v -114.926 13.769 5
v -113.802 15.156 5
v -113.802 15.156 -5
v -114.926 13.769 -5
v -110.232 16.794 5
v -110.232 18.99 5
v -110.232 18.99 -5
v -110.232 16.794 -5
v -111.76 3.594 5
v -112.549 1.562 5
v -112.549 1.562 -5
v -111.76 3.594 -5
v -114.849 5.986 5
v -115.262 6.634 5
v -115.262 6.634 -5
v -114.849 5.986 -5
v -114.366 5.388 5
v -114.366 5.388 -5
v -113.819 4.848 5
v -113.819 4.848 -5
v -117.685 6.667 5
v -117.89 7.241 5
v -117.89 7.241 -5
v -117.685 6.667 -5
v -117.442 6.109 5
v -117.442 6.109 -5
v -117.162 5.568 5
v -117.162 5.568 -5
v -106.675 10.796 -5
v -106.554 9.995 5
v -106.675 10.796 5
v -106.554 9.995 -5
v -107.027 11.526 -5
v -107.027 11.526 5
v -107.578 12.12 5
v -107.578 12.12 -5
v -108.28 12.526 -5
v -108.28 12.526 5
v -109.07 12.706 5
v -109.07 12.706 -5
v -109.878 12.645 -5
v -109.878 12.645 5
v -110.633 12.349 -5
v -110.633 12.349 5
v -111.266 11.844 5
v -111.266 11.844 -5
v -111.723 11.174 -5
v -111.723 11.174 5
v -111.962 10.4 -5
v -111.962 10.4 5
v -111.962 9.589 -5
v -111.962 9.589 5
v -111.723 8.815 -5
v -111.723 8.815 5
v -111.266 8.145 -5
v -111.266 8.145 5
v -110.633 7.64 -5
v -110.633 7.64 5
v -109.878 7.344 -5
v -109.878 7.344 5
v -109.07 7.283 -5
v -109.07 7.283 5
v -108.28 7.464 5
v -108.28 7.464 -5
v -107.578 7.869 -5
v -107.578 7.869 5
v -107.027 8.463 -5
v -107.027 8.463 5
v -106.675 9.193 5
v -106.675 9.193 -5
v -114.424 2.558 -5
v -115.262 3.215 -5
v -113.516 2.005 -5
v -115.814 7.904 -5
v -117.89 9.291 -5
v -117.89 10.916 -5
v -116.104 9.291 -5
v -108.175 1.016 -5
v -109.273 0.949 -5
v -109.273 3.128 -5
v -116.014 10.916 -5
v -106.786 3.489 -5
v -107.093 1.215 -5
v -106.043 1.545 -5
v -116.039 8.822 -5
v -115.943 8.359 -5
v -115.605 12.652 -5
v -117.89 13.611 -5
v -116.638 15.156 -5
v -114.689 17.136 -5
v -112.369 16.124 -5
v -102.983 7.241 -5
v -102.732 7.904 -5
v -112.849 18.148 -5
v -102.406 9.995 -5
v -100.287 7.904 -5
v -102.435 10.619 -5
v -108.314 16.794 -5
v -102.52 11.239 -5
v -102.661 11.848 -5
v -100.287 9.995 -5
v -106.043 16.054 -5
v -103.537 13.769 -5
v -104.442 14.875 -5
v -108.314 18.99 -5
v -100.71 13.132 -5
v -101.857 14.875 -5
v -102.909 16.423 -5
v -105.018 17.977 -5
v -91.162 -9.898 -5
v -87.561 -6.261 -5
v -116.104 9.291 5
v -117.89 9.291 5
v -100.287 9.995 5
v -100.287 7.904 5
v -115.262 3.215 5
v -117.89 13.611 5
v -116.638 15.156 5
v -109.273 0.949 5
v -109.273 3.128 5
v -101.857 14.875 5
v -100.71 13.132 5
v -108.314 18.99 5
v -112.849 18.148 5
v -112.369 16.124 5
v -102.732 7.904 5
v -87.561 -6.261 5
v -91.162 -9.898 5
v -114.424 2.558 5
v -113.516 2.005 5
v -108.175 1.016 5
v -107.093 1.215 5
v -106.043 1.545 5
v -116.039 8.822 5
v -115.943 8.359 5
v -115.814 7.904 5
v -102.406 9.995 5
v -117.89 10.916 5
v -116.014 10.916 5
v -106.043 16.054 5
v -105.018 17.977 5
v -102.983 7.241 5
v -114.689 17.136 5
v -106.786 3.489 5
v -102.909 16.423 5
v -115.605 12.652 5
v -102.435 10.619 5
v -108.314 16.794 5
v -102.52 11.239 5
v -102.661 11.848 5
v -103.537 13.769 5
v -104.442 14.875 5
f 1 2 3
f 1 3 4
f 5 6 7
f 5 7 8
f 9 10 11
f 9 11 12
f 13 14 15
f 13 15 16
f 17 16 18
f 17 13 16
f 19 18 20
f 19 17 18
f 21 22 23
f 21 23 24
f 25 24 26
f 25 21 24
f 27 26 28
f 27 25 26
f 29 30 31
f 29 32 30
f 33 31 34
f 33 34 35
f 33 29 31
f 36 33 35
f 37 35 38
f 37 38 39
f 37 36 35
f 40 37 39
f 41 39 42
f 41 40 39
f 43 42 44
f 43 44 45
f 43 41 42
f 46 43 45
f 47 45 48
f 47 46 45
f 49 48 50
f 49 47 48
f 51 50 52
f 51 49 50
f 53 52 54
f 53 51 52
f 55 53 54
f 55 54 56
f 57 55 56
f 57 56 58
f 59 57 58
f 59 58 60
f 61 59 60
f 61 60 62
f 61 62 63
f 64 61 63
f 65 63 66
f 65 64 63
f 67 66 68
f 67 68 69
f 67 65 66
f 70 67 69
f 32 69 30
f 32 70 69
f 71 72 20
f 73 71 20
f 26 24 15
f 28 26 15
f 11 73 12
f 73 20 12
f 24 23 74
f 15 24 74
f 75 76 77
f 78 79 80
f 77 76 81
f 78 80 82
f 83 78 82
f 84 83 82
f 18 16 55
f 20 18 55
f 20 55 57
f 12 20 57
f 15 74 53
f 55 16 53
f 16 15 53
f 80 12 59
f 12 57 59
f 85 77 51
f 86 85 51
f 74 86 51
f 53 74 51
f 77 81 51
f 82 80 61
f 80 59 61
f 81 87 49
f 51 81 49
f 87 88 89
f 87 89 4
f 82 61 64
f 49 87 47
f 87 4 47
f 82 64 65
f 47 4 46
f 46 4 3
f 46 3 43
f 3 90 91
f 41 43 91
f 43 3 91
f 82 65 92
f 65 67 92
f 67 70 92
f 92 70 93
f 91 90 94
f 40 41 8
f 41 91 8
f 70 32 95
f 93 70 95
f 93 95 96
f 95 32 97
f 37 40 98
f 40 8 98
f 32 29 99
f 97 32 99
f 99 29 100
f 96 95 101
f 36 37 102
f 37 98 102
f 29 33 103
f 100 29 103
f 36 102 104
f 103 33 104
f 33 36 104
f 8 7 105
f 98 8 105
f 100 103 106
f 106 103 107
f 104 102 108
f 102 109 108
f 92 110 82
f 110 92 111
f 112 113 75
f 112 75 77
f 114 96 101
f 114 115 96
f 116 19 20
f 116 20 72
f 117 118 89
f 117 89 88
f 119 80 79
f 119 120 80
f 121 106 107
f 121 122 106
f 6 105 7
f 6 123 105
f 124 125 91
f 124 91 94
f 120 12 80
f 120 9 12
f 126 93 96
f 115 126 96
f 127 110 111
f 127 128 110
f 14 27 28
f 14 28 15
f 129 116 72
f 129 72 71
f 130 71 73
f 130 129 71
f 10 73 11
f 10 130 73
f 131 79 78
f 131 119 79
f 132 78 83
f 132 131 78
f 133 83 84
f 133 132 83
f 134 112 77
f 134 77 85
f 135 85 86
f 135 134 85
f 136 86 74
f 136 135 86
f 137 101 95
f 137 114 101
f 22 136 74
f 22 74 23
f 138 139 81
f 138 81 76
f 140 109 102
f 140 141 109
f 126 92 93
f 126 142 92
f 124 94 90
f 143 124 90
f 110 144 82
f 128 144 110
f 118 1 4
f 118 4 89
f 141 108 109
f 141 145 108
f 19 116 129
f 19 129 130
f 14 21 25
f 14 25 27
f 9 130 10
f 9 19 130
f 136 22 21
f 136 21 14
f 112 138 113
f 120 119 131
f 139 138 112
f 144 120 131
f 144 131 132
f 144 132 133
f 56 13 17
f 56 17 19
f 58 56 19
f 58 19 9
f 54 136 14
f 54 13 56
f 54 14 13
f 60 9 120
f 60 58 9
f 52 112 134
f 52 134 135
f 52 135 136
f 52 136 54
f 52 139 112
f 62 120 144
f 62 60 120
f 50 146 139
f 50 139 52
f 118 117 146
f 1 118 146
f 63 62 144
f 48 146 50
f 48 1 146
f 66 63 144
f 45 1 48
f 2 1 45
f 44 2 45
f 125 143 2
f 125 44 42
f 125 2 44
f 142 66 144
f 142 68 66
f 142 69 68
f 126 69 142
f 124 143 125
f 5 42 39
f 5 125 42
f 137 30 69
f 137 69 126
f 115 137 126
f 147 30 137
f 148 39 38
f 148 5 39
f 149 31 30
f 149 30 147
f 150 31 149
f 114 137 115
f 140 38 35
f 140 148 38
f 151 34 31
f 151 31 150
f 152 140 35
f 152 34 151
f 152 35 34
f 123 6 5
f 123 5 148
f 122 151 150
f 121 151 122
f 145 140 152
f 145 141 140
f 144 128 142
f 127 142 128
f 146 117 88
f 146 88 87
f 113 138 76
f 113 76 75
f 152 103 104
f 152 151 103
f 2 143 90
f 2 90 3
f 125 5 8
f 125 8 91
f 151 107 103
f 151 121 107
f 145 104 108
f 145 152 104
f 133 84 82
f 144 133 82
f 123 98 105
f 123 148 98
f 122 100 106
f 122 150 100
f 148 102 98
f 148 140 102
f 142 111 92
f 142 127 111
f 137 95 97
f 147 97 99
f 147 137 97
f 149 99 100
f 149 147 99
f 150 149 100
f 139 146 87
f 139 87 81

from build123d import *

# Parameters (mm, degrees)
SKETCH7_R           = 2.718976156
BOSS_EXTRUDE5_DEPTH = 5


with BuildPart() as part:
    # Sketch7 → Boss-Extrude5 (new body, symmetric)
    with BuildSketch(Plane.XY):
        with BuildLine():
            Line((-108.314342925, 18.989771489), (-110.232079527, 18.989771489))
            Line((-110.232079527, 18.989771489), (-110.232079527, 16.794247959))
            Line((-110.232079527, 16.794247959), (-112.368671741, 16.124256422))
            Line((-112.368671741, 16.124256422), (-112.848780488, 18.148130182))
            Line((-112.848780488, 18.148130182), (-114.689202025, 17.136193302))
            Line((-114.689202025, 17.136193302), (-113.802244367, 15.156219029))
            Line((-113.802244367, 15.156219029), (-114.926218754, 13.769061439))
            Line((-114.926218754, 13.769061439), (-116.638184972, 15.156219029))
            Line((-116.638184972, 15.156219029), (-117.890010894, 13.611272945))
            Line((-117.890010894, 13.611272945), (-115.604979487, 12.652206929))
            Line((-115.604979487, 12.652206929), (-116.014015282, 10.916483695))
            Line((-116.014015282, 10.916483695), (-117.890010894, 10.916483695))
            Line((-117.890010894, 10.916483695), (-117.890010894, 9.290502395))
            Line((-117.890010894, 9.290502395), (-116.103879087, 9.290502395))
            ThreePointArc((-116.103879087, 9.290502395), (-115.994870907, 8.589969318), (-115.814214218, 7.904409303))
            Line((-115.814214218, 7.904409303), (-117.890010894, 7.24106602))
            ThreePointArc((-117.890010894, 7.24106602), (-117.56834444, 6.386019614), (-117.162078542, 5.567776566))
            Line((-117.162078542, 5.567776566), (-115.261641584, 6.634217149))
            ThreePointArc((-115.261641584, 6.634217149), (-114.615525484, 5.680316792), (-113.819022014, 4.847866116))
            Line((-113.819022014, 4.847866116), (-115.261641584, 3.214524472))
            ThreePointArc((-115.261641584, 3.214524472), (-113.978252901, 2.268462787), (-112.548700742, 1.562417569))
            Line((-112.548700742, 1.562417569), (-111.759631654, 3.593753614))
            Line((-111.759631654, 3.593753614), (-109.273211226, 3.127790889))
            Line((-109.273211226, 3.127790889), (-109.273211226, 0.948580907))
            ThreePointArc((-109.273211226, 0.948580907), (-107.630782877, 1.098932073), (-106.042950797, 1.544987721))
            Line((-106.042950797, 1.544987721), (-106.785965128, 3.488554168))
            Line((-106.785965128, 3.488554168), (-91.16192211, -9.89798132))
            Line((-91.16192211, -9.89798132), (-87.560983072, -6.260758332))
            Line((-87.560983072, -6.260758332), (-102.982615742, 7.24106602))
            Line((-102.982615742, 7.24106602), (-102.732208234, 7.904409303))
            Line((-102.732208234, 7.904409303), (-100.286956522, 7.904409303))
            Line((-100.286956522, 7.904409303), (-100.286956522, 9.994657565))
            Line((-100.286956522, 9.994657565), (-102.40634455, 9.994657565))
            ThreePointArc((-102.40634455, 9.994657565), (-102.470378556, 10.930245938), (-102.661286329, 11.848385459))
            Line((-102.661286329, 11.848385459), (-100.710110893, 13.132180531))
            Line((-100.710110893, 13.132180531), (-101.856516581, 14.874544766))
            Line((-101.856516581, 14.874544766), (-103.536684982, 13.769061439))
            Line((-103.536684982, 13.769061439), (-104.442004457, 14.874544766))
            Line((-104.442004457, 14.874544766), (-102.908814063, 16.423183965))
            Line((-102.908814063, 16.423183965), (-105.01782302, 17.977337199))
            Line((-105.01782302, 17.977337199), (-106.042950797, 16.054300748))
            Line((-106.042950797, 16.054300748), (-108.314342925, 16.794247959))
            Line((-108.314342925, 16.794247959), (-108.314342925, 18.989771489))
        make_face()
        with Locations((-109.273211226, 9.994657565)):
            Circle(SKETCH7_R, mode=Mode.SUBTRACT)
    extrude(amount=BOSS_EXTRUDE5_DEPTH, both=True)


solid = part.part
